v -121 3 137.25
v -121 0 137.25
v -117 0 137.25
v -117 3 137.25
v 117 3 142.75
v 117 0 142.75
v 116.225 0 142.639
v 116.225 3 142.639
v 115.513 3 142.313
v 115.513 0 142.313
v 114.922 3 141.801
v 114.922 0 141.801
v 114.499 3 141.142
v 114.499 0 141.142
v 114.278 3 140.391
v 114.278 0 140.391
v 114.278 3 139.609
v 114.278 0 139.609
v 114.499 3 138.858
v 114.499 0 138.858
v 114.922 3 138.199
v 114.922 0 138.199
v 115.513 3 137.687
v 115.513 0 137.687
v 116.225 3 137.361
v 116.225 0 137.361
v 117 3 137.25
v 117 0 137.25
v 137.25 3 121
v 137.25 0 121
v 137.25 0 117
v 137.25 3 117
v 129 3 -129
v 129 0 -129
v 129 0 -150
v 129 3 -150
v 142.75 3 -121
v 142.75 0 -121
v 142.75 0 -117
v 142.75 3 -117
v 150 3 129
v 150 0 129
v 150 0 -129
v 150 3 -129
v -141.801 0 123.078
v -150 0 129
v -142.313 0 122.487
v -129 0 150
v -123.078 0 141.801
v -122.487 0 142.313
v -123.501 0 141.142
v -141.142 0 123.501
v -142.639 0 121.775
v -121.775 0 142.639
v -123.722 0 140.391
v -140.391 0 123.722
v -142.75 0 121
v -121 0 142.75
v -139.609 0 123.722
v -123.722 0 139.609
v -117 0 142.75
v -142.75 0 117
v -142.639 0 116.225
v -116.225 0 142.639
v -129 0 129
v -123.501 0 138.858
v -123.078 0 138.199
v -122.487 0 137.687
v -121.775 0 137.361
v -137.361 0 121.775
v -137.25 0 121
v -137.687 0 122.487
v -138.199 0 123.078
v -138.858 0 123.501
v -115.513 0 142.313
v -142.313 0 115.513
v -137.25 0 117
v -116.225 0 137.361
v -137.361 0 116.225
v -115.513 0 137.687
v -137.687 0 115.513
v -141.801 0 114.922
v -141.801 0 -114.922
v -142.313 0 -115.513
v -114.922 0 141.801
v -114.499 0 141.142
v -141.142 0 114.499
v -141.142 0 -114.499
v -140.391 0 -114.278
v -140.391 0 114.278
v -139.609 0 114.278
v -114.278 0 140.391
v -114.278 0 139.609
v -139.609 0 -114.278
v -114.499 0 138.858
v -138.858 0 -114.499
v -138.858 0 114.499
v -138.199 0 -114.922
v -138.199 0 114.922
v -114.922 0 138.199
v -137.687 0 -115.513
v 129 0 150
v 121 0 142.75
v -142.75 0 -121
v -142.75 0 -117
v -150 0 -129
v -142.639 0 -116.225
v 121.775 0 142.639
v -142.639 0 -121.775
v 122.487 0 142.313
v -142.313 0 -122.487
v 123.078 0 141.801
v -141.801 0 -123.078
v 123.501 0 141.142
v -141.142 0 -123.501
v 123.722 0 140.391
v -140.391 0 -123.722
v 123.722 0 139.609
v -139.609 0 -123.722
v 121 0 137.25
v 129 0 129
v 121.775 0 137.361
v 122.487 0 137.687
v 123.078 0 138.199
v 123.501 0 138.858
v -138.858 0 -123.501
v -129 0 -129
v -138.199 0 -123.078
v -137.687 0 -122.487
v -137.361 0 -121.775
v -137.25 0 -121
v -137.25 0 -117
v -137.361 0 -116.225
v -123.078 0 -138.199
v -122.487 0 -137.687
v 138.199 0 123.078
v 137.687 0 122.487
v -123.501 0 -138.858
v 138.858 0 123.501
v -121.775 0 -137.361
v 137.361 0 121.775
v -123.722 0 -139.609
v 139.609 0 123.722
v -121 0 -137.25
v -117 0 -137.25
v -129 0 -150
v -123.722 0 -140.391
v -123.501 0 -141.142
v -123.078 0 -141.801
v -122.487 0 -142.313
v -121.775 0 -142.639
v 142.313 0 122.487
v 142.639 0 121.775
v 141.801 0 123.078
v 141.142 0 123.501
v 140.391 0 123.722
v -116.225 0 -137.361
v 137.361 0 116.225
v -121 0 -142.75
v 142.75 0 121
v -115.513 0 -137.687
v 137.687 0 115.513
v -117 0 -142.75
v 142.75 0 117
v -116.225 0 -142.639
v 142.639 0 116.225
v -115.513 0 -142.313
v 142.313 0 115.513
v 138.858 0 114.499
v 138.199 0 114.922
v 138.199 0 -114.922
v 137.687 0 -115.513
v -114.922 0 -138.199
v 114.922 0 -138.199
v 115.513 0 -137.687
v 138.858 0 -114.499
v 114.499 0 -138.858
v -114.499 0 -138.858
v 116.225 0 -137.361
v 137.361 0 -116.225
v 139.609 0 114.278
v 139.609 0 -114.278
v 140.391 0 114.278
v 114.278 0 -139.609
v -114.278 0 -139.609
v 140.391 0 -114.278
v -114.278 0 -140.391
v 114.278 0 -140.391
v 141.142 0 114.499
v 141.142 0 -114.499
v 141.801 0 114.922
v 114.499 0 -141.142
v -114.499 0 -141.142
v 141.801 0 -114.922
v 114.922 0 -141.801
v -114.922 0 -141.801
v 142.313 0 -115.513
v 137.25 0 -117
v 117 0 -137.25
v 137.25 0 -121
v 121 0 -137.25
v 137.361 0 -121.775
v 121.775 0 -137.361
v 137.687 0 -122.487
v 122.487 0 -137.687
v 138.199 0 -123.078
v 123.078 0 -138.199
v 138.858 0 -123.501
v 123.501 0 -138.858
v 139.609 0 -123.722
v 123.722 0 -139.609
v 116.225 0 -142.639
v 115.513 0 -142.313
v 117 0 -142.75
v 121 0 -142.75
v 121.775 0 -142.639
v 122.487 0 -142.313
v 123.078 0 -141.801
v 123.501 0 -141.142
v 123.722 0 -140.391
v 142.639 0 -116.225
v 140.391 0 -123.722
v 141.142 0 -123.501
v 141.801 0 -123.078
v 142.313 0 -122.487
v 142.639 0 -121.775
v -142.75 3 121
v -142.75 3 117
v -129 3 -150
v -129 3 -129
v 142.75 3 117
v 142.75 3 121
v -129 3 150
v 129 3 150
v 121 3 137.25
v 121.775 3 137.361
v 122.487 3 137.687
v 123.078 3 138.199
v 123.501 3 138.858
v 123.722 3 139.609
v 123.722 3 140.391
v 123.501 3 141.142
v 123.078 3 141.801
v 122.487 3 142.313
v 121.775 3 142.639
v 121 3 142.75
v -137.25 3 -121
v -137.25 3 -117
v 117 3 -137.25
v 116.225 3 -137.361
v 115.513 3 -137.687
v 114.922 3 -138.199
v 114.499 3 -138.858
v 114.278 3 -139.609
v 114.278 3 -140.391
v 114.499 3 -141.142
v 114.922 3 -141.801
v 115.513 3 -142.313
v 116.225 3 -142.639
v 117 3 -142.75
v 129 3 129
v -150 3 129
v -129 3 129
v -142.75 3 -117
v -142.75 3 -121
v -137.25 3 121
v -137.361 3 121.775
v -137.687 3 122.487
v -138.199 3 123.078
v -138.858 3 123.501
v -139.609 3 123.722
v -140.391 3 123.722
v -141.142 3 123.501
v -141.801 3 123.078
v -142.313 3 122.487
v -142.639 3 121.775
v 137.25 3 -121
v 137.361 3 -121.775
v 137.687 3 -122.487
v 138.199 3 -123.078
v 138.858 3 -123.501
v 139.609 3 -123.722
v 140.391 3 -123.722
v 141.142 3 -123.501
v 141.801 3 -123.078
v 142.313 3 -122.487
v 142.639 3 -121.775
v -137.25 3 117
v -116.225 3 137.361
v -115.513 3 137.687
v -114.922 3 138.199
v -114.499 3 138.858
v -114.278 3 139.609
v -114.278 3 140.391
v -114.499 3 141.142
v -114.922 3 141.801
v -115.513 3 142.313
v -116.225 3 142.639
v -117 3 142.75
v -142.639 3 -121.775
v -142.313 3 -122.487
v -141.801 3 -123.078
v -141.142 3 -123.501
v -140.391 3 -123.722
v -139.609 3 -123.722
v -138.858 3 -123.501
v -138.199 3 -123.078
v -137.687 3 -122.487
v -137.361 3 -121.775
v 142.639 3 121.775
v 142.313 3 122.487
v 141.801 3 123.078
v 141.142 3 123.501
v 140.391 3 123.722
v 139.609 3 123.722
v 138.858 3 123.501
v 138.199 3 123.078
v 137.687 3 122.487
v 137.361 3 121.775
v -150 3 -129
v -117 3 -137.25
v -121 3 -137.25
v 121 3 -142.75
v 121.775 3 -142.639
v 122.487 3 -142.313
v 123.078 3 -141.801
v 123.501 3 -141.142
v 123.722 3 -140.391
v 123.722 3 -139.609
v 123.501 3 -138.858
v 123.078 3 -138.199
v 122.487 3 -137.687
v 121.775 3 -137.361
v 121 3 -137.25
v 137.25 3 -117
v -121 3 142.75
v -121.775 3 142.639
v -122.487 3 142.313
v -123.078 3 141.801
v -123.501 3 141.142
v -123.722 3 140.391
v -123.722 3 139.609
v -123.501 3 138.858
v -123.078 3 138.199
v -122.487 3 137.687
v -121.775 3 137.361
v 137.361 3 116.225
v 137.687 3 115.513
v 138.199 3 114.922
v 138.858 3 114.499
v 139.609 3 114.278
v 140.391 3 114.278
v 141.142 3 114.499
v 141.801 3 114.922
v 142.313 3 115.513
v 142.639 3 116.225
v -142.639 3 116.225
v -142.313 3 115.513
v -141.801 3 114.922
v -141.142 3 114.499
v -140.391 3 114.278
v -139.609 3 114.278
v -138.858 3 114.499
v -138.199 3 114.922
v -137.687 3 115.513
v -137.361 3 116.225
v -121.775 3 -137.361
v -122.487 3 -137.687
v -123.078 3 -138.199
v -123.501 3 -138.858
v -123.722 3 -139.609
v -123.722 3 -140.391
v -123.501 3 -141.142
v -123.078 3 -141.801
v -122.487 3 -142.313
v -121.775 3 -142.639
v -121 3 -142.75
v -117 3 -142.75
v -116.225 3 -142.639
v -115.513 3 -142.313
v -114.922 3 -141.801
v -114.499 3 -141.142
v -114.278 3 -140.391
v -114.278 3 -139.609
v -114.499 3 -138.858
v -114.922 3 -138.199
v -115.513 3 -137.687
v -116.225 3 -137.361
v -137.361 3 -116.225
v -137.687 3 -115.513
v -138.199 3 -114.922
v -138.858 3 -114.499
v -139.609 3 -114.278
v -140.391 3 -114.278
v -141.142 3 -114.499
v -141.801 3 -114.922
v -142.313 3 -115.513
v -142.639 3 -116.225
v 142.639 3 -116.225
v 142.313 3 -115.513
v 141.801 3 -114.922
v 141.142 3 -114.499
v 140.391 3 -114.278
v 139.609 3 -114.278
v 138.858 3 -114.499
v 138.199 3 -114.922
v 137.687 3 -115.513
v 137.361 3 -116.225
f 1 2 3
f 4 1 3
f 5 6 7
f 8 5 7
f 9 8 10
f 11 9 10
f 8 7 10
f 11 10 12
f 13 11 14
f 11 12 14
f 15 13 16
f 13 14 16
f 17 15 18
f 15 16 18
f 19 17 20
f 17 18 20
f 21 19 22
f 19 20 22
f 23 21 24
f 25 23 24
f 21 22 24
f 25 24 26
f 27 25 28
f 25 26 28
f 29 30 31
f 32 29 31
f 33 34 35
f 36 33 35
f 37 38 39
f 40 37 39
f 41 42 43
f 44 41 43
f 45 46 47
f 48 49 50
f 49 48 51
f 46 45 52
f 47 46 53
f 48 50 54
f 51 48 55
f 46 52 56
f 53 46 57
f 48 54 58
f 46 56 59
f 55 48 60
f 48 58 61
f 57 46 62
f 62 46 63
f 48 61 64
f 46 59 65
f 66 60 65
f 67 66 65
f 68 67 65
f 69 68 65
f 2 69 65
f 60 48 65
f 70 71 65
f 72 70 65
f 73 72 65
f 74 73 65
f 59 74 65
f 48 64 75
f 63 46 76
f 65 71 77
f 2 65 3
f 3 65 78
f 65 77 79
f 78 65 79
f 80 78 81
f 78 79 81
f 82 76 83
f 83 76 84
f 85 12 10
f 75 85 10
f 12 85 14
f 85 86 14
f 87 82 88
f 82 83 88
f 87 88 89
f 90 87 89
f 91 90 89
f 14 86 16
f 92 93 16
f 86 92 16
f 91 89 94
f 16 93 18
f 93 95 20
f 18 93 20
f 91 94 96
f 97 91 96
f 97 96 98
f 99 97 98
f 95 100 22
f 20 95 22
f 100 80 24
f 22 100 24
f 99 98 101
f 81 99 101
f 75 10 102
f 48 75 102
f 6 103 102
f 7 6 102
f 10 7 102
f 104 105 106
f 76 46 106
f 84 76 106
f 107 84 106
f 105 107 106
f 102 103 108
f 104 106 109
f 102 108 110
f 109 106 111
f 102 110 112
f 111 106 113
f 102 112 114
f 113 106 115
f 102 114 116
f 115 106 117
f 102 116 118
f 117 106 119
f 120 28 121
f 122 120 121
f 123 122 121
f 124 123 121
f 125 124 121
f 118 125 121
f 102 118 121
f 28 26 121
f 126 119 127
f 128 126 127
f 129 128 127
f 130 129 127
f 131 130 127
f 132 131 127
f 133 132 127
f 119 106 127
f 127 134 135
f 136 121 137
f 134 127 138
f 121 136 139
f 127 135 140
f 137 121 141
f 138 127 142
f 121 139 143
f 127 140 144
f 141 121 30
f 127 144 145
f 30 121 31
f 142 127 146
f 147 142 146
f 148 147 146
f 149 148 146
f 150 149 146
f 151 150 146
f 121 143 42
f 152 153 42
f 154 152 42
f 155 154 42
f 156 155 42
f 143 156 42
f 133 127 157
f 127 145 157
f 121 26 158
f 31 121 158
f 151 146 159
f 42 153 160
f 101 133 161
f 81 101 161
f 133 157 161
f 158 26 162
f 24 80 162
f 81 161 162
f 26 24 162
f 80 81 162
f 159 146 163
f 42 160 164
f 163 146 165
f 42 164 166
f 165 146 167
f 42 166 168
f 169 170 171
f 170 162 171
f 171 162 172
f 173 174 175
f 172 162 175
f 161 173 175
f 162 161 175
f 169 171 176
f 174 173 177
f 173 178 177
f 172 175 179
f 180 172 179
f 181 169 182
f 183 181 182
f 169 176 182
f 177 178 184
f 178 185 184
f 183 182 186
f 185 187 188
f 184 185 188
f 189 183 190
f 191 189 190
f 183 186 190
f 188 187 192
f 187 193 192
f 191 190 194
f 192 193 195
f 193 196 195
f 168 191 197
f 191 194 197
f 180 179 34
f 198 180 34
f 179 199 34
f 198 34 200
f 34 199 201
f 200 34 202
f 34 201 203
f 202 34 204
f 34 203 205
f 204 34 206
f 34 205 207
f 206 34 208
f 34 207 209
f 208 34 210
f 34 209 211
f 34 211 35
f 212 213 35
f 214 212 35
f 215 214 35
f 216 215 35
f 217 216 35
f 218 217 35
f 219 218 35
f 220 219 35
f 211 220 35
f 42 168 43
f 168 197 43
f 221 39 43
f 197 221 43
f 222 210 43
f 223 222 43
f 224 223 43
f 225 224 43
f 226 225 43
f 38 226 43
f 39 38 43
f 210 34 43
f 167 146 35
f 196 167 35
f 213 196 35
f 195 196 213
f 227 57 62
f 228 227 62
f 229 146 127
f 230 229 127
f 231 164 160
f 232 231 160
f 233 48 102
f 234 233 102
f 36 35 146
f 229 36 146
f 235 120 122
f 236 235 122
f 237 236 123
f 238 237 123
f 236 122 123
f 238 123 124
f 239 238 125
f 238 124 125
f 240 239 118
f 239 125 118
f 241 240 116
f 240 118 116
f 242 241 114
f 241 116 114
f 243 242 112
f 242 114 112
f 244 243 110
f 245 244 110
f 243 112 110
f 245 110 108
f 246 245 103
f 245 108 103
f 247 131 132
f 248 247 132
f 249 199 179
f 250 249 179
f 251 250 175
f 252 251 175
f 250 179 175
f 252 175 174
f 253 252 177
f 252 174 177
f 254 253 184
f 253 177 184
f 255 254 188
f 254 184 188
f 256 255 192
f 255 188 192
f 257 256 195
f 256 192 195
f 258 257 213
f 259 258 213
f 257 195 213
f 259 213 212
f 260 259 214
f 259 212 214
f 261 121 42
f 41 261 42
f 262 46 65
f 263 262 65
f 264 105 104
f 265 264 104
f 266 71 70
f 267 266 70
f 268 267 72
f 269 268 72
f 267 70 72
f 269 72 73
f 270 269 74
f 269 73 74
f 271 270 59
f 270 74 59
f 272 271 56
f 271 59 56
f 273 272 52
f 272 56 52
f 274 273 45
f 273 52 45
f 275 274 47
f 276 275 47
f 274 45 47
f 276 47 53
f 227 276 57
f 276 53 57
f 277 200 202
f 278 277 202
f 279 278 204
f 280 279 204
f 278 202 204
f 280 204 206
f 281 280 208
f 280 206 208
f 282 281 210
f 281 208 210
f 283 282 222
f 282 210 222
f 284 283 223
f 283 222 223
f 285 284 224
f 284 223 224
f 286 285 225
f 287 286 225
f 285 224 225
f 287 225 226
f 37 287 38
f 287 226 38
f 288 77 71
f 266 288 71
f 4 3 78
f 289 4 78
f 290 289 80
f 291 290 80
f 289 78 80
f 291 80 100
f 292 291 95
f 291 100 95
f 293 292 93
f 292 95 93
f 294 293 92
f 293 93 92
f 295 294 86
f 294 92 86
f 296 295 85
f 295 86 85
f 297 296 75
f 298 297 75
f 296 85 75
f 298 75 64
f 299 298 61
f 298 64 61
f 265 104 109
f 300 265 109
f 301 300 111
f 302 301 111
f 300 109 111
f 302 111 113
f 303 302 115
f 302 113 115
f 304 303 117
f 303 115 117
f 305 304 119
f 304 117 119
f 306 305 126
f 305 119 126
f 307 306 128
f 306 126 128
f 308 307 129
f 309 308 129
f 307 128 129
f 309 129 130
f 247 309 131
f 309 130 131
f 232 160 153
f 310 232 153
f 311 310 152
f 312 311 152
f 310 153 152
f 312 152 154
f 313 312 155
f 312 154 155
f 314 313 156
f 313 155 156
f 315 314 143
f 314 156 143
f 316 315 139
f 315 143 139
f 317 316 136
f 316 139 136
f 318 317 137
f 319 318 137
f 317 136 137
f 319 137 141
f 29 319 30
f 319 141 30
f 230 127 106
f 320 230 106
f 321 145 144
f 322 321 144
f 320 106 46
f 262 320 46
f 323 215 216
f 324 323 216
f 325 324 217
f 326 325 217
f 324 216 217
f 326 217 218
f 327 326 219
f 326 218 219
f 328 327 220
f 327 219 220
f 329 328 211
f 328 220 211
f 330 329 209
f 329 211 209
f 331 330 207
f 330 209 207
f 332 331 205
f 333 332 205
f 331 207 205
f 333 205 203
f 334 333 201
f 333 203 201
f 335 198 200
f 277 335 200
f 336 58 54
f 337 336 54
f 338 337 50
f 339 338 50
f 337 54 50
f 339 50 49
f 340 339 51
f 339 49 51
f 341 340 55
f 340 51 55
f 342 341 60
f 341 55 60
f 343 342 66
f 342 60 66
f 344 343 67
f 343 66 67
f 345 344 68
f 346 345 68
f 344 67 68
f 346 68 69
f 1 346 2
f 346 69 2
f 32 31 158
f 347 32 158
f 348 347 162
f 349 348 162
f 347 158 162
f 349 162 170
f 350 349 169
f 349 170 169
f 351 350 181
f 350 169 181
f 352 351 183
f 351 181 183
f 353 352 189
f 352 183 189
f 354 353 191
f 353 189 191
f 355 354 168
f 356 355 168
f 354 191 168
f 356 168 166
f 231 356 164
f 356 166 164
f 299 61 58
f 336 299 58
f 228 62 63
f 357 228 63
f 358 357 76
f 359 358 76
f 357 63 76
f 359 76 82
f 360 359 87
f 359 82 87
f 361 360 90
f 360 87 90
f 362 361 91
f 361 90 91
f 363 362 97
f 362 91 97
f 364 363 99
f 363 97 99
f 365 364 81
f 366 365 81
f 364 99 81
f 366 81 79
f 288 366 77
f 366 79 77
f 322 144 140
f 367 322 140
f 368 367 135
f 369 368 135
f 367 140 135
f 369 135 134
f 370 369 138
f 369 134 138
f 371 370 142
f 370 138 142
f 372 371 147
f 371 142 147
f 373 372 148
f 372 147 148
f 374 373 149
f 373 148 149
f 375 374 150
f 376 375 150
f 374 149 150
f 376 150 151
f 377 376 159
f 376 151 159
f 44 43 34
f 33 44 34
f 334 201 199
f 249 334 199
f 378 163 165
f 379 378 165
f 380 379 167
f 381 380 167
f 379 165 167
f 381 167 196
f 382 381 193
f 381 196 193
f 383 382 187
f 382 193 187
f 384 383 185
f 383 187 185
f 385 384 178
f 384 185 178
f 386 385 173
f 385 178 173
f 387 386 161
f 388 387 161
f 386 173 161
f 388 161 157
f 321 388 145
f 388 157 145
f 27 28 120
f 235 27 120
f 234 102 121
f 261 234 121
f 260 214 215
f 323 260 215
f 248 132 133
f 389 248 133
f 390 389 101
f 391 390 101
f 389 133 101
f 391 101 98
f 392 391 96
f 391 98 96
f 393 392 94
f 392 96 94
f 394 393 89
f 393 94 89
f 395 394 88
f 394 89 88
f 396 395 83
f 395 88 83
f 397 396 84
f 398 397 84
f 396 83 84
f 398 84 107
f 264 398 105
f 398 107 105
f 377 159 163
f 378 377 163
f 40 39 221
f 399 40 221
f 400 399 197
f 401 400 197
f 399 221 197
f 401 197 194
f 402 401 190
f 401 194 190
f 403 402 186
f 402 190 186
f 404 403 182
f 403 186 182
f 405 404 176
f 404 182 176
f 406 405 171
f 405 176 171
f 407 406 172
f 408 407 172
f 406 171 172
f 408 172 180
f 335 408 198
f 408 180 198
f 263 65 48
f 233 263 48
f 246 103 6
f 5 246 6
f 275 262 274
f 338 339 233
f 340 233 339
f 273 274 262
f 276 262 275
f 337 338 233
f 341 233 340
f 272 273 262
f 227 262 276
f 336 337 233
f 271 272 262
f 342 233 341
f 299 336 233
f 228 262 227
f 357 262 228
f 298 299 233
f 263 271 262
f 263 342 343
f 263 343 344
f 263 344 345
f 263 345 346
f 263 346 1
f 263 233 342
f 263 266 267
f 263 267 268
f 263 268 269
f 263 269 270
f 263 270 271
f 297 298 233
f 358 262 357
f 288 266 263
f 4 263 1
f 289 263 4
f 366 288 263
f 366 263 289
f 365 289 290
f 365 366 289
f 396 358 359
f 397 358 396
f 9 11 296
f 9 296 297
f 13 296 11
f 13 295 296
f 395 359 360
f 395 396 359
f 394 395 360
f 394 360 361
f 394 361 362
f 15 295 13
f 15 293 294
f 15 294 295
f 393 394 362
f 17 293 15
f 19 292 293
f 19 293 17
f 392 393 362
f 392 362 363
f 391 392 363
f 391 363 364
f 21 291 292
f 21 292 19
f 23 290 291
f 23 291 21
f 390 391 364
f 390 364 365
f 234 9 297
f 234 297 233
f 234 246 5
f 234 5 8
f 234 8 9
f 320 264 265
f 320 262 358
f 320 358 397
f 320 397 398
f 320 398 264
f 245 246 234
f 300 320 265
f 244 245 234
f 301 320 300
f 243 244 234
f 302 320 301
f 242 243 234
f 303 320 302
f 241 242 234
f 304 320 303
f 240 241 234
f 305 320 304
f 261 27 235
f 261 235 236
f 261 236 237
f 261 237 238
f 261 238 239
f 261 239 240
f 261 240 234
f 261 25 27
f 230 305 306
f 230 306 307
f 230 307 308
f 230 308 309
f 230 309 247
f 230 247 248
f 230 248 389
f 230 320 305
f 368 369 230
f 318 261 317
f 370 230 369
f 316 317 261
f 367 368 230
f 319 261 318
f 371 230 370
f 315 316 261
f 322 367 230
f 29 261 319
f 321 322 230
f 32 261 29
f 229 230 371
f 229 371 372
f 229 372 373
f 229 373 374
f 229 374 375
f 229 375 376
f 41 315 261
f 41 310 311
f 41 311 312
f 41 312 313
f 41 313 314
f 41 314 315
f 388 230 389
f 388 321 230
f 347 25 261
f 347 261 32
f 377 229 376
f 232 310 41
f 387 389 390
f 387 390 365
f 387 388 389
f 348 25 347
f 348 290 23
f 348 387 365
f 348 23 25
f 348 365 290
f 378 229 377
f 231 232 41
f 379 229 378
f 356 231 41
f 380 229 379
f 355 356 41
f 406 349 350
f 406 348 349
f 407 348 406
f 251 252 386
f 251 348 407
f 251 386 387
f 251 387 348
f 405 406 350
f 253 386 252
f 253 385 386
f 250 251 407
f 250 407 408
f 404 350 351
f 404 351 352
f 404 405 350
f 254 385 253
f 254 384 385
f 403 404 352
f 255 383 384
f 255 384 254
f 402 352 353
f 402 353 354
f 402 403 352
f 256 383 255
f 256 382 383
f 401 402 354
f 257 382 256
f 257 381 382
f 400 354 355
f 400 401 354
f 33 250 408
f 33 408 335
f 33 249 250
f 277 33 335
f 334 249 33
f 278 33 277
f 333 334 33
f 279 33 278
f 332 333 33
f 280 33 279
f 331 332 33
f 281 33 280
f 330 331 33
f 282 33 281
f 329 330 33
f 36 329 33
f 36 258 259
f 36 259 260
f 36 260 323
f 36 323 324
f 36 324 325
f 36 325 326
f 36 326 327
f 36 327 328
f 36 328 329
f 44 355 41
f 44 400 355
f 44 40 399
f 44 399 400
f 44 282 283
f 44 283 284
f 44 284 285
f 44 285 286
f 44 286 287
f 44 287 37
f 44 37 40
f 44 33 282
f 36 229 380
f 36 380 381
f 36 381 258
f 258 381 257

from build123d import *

# Parameters (mm, degrees)
BOSS_EXTRUDE1_DEPTH = 3


with BuildPart() as part:
    # Sketch1 → Boss-Extrude1 (new body)
    with BuildSketch(Plane(origin=(0, 0, 0), x_dir=(1, 0, 0), z_dir=(0, 1, 0))):
        Polygon((-129, -129), (-129, -150), (129, -150), (129, -129), (150, -129), (150, 129), (129, 129), (129, 150), (-129, 150), (-129, 129), (-150, 129), (-150, -129), align=None)
        with BuildLine():
            Line((-117, -142.75), (-121, -142.75))
            ThreePointArc((-121, -142.75), (-123.75, -140), (-121, -137.25))
            Line((-121, -137.25), (-117, -137.25))
            ThreePointArc((-117, -137.25), (-114.25, -140), (-117, -142.75))
        make_face(mode=Mode.SUBTRACT)
        with BuildLine():
            Line((-137.25, -117), (-137.25, -121))
            ThreePointArc((-137.25, -121), (-140, -123.75), (-142.75, -121))
            Line((-142.75, -121), (-142.75, -117))
            ThreePointArc((-142.75, -117), (-140, -114.25), (-137.25, -117))
        make_face(mode=Mode.SUBTRACT)
        with BuildLine():
            ThreePointArc((121, -137.25), (123.75, -140), (121, -142.75))
            Line((121, -142.75), (117, -142.75))
            ThreePointArc((117, -142.75), (114.25, -140), (117, -137.25))
            Line((117, -137.25), (121, -137.25))
        make_face(mode=Mode.SUBTRACT)
        with BuildLine():
            ThreePointArc((142.75, -121), (140, -123.75), (137.25, -121))
            Line((137.25, -121), (137.25, -117))
            ThreePointArc((137.25, -117), (140, -114.25), (142.75, -117))
            Line((142.75, -117), (142.75, -121))
        make_face(mode=Mode.SUBTRACT)
        with BuildLine():
            ThreePointArc((-142.75, 121), (-140, 123.75), (-137.25, 121))
            Line((-137.25, 121), (-137.25, 117))
            ThreePointArc((-137.25, 117), (-140, 114.25), (-142.75, 117))
            Line((-142.75, 117), (-142.75, 121))
        make_face(mode=Mode.SUBTRACT)
        with BuildLine():
            ThreePointArc((-121, 137.25), (-123.75, 140), (-121, 142.75))
            Line((-121, 142.75), (-117, 142.75))
            ThreePointArc((-117, 142.75), (-114.25, 140), (-117, 137.25))
            Line((-117, 137.25), (-121, 137.25))
        make_face(mode=Mode.SUBTRACT)
        with BuildLine():
            Line((137.25, 117), (137.25, 121))
            ThreePointArc((137.25, 121), (140, 123.75), (142.75, 121))
            Line((142.75, 121), (142.75, 117))
            ThreePointArc((142.75, 117), (140, 114.25), (137.25, 117))
        make_face(mode=Mode.SUBTRACT)
        with BuildLine():
            Line((117, 142.75), (121, 142.75))
            ThreePointArc((121, 142.75), (123.75, 140), (121, 137.25))
            Line((121, 137.25), (117, 137.25))
            ThreePointArc((117, 137.25), (114.25, 140), (117, 142.75))
        make_face(mode=Mode.SUBTRACT)
    extrude(amount=BOSS_EXTRUDE1_DEPTH)


solid = part.part
